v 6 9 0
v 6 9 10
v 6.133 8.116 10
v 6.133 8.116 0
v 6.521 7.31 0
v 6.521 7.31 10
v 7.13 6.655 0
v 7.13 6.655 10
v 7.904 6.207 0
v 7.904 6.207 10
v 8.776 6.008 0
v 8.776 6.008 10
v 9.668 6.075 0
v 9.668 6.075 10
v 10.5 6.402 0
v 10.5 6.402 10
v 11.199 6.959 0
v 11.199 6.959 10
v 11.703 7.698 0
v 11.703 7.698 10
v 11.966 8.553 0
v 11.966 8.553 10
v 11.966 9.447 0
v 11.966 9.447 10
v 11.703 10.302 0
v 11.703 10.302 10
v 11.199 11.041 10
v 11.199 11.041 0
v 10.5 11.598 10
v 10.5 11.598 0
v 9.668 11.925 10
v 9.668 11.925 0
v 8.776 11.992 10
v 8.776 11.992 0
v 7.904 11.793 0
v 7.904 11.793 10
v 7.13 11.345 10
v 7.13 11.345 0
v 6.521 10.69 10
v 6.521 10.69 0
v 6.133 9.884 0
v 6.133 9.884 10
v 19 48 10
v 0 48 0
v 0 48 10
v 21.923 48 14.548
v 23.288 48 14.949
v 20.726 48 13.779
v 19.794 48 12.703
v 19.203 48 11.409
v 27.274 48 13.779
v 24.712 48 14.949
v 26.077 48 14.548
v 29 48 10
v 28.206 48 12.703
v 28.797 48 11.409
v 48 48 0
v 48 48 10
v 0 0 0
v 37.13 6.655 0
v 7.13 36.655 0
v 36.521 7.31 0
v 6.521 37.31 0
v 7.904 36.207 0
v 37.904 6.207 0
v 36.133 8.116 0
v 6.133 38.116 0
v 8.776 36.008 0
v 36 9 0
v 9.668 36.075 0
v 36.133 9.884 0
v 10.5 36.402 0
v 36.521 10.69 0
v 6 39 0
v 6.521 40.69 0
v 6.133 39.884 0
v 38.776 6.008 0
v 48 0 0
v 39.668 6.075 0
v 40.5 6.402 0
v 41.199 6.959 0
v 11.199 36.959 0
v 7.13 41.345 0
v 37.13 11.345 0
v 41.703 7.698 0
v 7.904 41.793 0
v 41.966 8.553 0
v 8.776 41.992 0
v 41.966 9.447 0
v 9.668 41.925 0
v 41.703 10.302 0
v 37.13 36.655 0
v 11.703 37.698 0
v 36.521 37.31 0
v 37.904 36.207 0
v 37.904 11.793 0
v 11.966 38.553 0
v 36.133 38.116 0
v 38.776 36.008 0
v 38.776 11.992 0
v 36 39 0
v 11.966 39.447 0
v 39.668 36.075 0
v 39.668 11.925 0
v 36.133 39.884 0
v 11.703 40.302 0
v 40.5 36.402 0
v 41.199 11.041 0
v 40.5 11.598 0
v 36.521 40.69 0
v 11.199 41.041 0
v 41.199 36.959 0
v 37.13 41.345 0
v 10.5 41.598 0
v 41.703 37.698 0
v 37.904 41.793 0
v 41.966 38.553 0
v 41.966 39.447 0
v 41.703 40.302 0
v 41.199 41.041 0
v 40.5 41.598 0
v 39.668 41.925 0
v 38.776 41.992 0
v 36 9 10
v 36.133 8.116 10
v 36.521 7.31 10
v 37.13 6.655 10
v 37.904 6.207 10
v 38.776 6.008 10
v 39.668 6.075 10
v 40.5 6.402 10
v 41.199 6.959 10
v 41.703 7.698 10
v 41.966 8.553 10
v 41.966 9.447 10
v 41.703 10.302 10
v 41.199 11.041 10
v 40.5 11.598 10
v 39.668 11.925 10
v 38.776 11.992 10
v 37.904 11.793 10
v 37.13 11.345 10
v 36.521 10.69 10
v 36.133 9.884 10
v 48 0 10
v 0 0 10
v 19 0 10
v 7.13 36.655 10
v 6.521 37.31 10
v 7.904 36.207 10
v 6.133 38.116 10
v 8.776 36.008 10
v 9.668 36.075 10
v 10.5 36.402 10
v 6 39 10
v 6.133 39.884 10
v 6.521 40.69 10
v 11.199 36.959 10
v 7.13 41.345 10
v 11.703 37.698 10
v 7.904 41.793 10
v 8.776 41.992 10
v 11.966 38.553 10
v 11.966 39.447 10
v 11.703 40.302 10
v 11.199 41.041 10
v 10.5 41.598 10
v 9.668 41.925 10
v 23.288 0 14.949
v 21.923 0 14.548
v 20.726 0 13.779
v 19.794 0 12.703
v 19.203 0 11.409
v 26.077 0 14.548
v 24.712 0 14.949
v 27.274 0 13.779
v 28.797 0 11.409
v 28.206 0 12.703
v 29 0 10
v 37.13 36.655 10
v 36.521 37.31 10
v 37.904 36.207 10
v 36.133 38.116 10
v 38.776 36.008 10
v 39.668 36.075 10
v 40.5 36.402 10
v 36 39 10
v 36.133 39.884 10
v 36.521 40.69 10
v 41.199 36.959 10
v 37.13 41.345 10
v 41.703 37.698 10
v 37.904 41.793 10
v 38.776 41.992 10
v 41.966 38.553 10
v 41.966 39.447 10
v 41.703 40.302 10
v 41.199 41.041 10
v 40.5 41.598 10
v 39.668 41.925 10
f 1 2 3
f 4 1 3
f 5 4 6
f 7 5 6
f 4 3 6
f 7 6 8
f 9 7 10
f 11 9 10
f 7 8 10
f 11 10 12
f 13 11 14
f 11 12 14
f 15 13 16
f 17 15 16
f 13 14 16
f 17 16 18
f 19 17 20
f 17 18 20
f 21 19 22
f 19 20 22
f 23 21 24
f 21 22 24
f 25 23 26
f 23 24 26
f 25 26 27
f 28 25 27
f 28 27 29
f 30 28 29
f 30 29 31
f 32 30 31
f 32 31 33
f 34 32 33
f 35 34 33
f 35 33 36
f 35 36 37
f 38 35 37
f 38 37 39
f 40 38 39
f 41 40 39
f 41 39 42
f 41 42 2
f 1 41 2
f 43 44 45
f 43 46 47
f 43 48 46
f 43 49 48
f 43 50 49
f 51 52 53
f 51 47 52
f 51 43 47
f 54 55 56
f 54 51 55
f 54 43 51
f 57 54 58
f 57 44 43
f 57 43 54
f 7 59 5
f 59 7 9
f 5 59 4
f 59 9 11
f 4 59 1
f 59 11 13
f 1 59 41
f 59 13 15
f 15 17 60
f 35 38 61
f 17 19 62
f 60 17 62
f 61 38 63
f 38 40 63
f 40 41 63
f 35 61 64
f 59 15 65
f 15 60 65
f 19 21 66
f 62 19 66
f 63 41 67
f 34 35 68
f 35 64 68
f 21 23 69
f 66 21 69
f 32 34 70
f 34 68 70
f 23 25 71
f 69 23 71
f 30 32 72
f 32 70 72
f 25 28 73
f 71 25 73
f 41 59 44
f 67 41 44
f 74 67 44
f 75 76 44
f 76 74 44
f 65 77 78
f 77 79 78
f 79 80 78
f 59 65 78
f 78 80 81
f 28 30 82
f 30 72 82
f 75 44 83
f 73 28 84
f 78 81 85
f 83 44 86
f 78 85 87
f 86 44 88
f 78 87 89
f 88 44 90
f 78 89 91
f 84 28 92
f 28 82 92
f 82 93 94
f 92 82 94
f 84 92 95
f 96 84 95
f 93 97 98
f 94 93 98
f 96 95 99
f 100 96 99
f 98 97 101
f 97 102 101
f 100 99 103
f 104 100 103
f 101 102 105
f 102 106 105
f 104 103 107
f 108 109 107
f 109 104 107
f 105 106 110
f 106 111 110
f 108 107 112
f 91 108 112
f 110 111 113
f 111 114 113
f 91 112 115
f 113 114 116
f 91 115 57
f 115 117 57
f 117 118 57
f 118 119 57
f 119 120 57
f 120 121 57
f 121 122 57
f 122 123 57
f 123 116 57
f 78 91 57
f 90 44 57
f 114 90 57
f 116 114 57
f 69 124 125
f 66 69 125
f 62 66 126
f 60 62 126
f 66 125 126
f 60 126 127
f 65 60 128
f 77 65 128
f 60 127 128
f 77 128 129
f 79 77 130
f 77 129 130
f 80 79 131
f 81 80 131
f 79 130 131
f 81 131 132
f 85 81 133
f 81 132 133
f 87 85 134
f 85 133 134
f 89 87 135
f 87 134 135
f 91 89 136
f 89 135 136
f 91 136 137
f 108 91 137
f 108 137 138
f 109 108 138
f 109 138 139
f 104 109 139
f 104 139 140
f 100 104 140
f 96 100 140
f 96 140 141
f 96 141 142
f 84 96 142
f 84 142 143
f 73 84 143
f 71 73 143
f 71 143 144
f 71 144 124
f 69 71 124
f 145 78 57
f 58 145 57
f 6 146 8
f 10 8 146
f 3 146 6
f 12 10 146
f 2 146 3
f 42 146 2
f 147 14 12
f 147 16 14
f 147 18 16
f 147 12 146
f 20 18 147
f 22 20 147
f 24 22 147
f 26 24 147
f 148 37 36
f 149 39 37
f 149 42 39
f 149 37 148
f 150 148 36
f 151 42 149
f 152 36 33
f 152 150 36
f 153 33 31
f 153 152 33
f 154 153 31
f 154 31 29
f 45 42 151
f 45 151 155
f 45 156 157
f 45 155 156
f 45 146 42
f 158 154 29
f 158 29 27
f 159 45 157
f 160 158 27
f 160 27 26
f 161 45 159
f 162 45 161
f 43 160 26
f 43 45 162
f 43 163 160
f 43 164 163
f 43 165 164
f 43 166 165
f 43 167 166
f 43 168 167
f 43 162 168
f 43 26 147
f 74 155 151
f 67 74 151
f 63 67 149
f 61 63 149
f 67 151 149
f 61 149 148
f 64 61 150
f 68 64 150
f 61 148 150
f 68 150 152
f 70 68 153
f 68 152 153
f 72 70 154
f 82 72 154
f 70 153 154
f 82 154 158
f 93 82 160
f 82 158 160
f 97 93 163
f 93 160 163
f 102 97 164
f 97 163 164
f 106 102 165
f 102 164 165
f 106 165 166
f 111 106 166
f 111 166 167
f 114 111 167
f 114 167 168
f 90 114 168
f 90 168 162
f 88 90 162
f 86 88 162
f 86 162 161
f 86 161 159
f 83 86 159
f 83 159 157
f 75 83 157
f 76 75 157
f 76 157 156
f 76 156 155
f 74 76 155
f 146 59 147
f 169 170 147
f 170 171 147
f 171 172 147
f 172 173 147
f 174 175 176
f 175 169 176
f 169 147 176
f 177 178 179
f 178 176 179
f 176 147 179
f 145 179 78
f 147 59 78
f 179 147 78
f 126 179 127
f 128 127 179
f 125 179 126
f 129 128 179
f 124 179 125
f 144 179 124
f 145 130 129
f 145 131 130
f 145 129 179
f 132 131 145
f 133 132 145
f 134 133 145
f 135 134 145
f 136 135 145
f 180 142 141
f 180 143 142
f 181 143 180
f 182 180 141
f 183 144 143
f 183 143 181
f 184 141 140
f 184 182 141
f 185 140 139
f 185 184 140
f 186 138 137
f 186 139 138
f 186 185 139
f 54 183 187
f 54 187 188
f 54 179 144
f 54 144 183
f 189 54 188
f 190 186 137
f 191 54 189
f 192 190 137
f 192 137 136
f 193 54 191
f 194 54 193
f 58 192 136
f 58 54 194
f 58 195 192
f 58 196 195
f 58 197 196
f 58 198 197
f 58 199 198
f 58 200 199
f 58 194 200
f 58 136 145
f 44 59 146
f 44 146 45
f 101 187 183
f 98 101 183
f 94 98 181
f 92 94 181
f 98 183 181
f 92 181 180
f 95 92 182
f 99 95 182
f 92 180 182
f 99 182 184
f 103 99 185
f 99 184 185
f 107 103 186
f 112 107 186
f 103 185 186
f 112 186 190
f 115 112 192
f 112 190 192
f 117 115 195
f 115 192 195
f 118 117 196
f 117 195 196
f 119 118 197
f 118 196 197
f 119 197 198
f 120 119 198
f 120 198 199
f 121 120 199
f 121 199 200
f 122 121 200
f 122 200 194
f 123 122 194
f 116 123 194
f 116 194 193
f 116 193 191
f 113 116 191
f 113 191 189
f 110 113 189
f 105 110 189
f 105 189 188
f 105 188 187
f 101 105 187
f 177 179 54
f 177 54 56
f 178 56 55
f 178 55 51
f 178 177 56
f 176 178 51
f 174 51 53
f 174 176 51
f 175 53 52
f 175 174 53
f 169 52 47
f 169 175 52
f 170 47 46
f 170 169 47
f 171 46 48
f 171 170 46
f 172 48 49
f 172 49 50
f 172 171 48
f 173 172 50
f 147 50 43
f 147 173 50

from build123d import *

# Parameters (mm, degrees)
F0_W     = 48
F0_H     = 48
F1_DEPTH = 10
F3_DEPTH = 48
F5_D     = 6


with BuildPart() as f1:
    # F0 (on Top) → F1 (new body)
    with BuildSketch(Plane.XY):
        with Locations((24, 24)):
            Rectangle(F0_W, F0_H)
    extrude(amount=F1_DEPTH)

    # F2 (on face) → F3 (join, through all)
    with BuildSketch(Plane.XZ):
        with BuildLine():
            Line((19, 10), (29, 10))
            ThreePointArc((29, 10), (24, 15), (19, 10))
        make_face()
    extrude(amount=-F3_DEPTH)

    # F5 (through all)
    with Locations(Plane(origin=(0, 0, 0), x_dir=(1, 0, 0), z_dir=(0, 0, -1))):
        with Locations((9, -9), (9, -39), (39, -39), (39, -9)):
            Hole(F5_D / 2)


solid = f1.part
